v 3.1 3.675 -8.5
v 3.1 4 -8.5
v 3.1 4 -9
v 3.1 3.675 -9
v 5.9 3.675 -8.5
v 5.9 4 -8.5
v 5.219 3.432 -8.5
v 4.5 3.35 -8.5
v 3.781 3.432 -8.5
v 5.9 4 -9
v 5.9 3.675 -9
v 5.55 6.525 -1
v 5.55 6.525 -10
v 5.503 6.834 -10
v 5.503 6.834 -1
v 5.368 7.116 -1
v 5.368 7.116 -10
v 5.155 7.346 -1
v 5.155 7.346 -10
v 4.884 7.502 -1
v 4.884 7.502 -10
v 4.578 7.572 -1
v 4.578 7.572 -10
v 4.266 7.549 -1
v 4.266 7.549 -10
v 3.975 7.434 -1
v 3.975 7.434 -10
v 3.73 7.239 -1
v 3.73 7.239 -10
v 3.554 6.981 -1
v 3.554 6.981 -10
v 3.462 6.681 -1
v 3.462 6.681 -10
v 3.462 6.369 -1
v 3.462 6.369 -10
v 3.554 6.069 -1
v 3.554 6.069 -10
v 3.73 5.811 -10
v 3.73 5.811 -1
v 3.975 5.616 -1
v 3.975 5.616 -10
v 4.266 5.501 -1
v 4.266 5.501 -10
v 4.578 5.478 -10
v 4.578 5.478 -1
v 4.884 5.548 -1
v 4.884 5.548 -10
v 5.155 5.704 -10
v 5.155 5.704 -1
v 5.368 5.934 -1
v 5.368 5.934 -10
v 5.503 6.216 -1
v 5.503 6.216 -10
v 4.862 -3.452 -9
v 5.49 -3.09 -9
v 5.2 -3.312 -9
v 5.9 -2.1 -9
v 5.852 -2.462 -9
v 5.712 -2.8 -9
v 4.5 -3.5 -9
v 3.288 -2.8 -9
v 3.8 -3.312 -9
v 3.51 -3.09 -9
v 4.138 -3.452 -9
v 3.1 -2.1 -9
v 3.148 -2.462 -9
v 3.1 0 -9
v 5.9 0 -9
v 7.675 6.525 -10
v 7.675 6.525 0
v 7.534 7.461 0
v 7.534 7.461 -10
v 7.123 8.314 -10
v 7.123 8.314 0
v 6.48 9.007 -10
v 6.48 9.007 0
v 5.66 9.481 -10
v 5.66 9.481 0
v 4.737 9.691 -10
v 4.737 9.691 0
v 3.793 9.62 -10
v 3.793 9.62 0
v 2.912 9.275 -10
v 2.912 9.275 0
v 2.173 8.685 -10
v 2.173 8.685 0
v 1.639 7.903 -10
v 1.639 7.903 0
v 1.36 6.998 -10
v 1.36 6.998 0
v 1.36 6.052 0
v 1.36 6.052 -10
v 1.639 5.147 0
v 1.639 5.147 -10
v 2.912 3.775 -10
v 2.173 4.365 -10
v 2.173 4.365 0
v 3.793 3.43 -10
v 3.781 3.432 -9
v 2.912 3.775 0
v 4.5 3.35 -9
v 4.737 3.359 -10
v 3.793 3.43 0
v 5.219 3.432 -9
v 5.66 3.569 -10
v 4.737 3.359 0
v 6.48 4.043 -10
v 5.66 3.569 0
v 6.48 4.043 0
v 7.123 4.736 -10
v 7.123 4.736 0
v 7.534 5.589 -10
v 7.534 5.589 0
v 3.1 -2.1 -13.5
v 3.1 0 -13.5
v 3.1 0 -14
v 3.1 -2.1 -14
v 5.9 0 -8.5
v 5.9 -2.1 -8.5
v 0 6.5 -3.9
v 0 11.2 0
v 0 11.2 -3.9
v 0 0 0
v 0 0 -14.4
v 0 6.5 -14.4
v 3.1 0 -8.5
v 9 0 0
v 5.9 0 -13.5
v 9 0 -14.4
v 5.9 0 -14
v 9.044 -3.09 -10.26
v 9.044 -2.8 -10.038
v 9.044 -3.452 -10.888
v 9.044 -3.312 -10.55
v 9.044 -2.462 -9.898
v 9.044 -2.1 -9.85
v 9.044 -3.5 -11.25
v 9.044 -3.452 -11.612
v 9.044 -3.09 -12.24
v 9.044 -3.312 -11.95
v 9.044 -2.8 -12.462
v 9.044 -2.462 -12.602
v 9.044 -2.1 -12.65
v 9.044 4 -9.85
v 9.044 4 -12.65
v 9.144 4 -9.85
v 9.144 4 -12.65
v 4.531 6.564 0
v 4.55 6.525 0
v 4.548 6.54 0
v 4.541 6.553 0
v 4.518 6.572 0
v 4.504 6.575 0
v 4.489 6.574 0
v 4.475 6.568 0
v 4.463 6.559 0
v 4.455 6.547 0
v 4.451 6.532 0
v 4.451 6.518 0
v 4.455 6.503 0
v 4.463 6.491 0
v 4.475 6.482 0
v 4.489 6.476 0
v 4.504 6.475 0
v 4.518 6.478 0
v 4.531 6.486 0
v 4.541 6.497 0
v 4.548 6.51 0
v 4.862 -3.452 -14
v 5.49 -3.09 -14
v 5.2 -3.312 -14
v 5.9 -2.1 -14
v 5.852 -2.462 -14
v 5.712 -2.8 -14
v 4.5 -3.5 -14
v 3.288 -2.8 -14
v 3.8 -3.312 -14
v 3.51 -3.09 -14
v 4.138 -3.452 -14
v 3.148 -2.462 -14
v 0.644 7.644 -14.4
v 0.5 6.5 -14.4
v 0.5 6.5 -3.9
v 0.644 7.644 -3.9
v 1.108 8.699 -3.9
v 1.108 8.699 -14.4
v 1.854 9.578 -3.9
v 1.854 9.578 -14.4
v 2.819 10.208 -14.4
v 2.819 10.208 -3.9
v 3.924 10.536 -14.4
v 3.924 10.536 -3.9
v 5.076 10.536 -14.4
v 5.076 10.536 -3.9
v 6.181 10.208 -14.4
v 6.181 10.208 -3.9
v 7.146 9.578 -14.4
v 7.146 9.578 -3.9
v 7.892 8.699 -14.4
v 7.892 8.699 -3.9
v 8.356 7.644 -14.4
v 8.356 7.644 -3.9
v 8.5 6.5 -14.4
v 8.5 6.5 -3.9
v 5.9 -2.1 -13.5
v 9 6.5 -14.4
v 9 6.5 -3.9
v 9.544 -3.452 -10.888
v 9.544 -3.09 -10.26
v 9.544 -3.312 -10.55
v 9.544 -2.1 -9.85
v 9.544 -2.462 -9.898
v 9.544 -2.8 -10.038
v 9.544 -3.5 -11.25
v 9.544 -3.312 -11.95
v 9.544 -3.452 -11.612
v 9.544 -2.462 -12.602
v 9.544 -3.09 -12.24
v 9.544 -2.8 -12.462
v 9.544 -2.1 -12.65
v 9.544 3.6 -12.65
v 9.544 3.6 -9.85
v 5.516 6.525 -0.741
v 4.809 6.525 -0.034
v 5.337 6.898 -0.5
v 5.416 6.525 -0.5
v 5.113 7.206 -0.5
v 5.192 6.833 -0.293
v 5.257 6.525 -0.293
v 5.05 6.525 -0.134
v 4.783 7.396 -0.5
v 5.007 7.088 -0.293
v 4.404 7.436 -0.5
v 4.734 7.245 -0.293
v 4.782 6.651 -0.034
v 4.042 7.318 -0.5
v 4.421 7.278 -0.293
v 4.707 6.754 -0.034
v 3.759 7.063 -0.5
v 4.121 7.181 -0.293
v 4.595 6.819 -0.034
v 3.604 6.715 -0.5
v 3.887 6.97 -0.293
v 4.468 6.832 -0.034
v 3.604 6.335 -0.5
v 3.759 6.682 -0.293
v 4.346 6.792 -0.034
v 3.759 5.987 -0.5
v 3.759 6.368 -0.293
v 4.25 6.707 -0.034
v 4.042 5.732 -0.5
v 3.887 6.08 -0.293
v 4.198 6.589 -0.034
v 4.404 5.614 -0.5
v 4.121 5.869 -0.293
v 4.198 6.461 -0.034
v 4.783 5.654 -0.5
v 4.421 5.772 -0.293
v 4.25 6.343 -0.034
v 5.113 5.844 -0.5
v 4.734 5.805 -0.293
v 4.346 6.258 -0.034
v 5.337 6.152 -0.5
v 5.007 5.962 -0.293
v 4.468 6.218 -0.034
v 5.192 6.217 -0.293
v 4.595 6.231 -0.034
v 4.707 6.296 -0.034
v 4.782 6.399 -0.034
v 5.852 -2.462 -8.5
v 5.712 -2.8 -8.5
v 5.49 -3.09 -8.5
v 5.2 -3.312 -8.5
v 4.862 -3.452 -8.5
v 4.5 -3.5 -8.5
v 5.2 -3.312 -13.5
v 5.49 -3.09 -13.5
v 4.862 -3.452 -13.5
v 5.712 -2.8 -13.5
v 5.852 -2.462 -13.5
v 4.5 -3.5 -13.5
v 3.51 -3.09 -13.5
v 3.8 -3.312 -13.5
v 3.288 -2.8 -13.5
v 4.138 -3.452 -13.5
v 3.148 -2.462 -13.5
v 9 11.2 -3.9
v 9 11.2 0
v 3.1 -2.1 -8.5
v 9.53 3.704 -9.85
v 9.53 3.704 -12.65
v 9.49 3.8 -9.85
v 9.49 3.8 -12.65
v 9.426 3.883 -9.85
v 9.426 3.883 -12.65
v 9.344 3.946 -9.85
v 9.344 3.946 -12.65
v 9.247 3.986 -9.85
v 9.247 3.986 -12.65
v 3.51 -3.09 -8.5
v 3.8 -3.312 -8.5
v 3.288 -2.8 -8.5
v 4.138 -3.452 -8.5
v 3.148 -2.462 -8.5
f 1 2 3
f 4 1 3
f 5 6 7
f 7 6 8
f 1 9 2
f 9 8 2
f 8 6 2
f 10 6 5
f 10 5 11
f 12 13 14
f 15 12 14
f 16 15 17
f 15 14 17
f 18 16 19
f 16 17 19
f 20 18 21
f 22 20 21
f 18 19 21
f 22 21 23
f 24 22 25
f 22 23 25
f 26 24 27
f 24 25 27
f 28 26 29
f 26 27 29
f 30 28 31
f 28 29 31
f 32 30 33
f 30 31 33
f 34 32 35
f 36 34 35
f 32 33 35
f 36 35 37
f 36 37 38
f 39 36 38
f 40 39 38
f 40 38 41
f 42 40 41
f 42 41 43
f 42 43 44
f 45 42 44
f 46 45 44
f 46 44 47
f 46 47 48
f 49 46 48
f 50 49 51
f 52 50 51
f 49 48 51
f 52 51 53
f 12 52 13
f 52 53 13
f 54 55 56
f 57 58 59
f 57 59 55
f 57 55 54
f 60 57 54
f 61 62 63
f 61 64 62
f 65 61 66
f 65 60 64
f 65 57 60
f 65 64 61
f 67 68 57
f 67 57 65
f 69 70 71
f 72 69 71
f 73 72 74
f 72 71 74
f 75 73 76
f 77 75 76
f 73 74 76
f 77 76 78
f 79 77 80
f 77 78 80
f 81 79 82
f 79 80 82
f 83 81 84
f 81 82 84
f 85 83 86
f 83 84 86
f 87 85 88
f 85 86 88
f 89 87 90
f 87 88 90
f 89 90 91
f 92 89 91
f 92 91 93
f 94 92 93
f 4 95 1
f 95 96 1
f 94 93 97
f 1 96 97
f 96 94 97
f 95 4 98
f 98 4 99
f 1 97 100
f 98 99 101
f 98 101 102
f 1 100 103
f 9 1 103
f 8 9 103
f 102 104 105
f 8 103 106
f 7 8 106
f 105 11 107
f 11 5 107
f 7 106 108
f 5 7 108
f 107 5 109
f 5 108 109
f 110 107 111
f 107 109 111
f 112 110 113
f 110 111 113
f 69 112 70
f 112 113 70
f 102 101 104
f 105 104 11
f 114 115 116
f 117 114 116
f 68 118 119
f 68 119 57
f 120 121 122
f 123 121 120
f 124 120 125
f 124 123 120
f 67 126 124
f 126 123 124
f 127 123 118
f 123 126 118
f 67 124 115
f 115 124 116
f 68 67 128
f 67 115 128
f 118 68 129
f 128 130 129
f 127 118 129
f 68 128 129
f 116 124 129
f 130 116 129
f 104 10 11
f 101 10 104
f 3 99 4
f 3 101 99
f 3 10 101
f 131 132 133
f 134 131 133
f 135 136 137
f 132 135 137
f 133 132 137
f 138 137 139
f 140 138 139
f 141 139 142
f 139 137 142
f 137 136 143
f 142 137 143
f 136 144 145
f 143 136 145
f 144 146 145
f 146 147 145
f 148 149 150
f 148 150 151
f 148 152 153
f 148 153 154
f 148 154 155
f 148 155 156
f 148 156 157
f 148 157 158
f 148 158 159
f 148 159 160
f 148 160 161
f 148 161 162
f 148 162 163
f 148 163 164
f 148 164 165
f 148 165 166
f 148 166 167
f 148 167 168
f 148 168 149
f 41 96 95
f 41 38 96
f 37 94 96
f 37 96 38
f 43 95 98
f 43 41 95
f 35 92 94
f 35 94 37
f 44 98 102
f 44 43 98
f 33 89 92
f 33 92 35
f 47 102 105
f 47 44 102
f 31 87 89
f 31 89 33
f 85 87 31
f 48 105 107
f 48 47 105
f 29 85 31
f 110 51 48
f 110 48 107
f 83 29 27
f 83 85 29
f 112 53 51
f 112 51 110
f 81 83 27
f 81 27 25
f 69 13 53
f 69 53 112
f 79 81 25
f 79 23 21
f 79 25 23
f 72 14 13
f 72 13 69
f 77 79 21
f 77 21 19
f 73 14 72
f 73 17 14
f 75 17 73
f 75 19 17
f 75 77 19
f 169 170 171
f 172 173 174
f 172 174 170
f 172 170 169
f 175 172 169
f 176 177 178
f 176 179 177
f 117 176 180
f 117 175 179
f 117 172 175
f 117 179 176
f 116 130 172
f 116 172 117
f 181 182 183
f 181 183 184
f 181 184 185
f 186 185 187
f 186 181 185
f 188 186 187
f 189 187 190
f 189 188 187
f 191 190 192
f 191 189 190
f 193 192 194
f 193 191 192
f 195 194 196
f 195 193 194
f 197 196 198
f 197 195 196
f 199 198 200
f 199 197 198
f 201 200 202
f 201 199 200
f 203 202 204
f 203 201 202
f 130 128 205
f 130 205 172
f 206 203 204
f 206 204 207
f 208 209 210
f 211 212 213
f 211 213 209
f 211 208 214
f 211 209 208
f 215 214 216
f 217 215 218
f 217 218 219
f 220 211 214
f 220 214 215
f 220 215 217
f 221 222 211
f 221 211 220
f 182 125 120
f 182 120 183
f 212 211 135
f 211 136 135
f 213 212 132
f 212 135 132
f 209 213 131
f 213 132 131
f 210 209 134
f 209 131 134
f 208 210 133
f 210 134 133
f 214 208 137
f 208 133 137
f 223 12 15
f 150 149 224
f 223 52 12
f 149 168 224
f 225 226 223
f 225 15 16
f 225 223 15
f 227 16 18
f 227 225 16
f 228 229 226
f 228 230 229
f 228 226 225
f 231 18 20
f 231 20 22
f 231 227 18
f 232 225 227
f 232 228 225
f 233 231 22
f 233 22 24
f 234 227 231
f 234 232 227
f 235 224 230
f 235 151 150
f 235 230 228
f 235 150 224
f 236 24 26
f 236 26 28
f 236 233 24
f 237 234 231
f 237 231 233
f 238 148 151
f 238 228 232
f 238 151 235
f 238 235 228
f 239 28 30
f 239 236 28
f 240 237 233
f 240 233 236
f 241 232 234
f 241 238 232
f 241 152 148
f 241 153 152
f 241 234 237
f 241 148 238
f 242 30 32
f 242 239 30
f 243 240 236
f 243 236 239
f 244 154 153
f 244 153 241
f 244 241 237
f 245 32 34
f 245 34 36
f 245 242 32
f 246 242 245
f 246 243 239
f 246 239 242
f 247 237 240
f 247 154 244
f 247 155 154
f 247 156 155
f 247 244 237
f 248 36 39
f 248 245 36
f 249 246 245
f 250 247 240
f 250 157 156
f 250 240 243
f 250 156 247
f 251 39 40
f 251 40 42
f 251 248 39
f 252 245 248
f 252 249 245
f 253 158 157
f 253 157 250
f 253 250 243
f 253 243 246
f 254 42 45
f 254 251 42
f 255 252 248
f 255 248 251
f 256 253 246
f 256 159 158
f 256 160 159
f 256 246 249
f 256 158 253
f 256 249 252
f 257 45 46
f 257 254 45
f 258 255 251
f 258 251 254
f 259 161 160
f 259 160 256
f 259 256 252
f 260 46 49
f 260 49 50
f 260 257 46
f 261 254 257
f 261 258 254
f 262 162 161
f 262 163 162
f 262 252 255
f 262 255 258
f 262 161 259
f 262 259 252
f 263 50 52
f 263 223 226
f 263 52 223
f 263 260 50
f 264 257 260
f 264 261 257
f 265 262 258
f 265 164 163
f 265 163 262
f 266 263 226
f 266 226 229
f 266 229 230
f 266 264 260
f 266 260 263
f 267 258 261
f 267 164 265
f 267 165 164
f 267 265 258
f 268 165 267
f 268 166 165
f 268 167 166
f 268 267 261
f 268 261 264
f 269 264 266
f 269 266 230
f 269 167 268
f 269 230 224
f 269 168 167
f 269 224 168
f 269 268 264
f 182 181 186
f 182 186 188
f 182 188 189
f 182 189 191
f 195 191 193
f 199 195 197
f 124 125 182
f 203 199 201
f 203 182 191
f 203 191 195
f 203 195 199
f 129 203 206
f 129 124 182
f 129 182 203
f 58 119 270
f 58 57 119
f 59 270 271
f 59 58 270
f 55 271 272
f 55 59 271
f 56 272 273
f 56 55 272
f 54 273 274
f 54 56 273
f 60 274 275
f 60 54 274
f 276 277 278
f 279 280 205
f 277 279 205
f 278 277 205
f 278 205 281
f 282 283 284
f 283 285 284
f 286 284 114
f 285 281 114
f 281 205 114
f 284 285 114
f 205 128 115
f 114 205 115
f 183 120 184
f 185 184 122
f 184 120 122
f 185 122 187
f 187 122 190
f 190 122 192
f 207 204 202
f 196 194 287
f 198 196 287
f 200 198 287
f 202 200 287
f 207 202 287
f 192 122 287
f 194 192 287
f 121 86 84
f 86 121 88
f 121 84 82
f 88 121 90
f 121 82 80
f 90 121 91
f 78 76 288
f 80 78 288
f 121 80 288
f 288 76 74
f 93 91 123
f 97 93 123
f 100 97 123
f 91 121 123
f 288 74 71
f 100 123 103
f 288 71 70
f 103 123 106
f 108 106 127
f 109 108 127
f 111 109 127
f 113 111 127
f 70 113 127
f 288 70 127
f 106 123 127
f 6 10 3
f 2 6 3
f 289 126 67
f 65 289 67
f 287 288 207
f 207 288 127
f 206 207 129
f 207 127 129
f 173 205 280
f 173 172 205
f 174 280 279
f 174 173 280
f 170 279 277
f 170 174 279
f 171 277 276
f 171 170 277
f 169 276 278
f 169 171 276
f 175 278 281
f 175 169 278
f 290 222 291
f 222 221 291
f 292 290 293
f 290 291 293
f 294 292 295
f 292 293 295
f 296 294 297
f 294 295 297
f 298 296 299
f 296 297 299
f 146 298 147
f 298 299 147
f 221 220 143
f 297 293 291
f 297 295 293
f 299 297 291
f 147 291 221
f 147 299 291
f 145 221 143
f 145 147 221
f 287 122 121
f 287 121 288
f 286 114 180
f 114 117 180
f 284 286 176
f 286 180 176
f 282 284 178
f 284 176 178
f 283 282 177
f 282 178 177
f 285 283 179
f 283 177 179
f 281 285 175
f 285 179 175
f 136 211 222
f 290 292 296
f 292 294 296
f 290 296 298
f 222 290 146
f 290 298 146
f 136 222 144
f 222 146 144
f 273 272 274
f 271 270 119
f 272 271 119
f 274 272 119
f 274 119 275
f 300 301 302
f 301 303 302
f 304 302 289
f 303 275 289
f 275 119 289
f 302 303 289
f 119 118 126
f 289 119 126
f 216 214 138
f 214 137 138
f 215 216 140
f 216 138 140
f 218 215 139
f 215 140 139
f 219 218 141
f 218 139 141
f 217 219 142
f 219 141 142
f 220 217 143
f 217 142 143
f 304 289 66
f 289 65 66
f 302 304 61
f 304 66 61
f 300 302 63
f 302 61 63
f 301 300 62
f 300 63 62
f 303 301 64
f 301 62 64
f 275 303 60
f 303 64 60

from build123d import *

# Parameters (mm, degrees)
SCHIZZO1_W                        = 9
SCHIZZO1_H                        = 14.4
ESTRUSIONE_ESTRUSIONE1_DEPTH      = 11.2
SCHIZZO2_R                        = 3.175
TAGLIO_ESTRUSIONE1_DEPTH          = 10
SCHIZZO3_R                        = 1.05
ESTRUSIONE_ESTRUSIONE2_DEPTH      = 10
RACCORDO1_R                       = 1
TAGLIO_ESTRUSIONE2_DEPTH          = 10.5
ESTRUSIONE_ESTRUSIONE3_DEPTH      = 3.5
ESTRUSIONE_ESTRUSIONE3_DEPTH_BACK = 4
SCHIZZO5_W                        = 2.8
SCHIZZO5_H                        = 0.5
SCHIZZO5_W_2                      = 0.5
SCHIZZO5_H_2                      = 2.8
RACCORDO2_R                       = 0.4
RACCORDO3_R                       = 1.4
RACCORDO4_R                       = 1.4
RACCORDO5_R                       = 1.4


with BuildPart() as part:
    # Schizzo1 → Estrusione-Estrusione1 (new body)
    with BuildSketch(Plane(origin=(0, 0, 0), x_dir=(1, 0, 0), z_dir=(0, 1, 0))):
        with Locations((4.5, 7.2)):
            Rectangle(SCHIZZO1_W, SCHIZZO1_H)
    extrude(amount=ESTRUSIONE_ESTRUSIONE1_DEPTH)

    # Schizzo2 → Taglio-Estrusione1 (cut)
    with BuildSketch(Plane.XY):
        with Locations((4.5, 6.525)):
            Circle(SCHIZZO2_R)
    extrude(amount=-TAGLIO_ESTRUSIONE1_DEPTH, mode=Mode.SUBTRACT)

    # Schizzo3 → Estrusione-Estrusione2 (add)
    with BuildSketch(Plane.XY.offset(-10)):
        with Locations((4.5, 6.525)):
            Circle(SCHIZZO3_R)
    extrude(amount=ESTRUSIONE_ESTRUSIONE2_DEPTH)

    # Raccordo1
    raccordo1_edges = [part.edges().sort_by_distance(p)[0] for p in [
        (3.45, 6.525, 0),
    ]]
    fillet(raccordo1_edges, radius=RACCORDO1_R)

    # Schizzo4 → Taglio-Estrusione2 (cut)
    with BuildSketch(Plane(origin=(0, 0, -14.4), x_dir=(-1, 0, 0), z_dir=(0, 0, -1))):
        with BuildLine():
            Line((-9, 6.5), (-9, 11.2))
            Line((-9, 11.2), (0, 11.2))
            Line((0, 11.2), (0, 6.5))
            Line((0, 6.5), (-0.5, 6.5))
            ThreePointArc((-0.5, 6.5), (-4.5, 10.578198038), (-8.5, 6.5))
            Line((-8.5, 6.5), (-9, 6.5))
        make_face()
    extrude(amount=-TAGLIO_ESTRUSIONE2_DEPTH, mode=Mode.SUBTRACT)

    # Schizzo5 → Estrusione-Estrusione3 (add, two sides: drawn at the far end of the back side and taken through both)
    with BuildSketch(Plane(origin=(0, 0, 0), x_dir=(-1, 0, 0), z_dir=(0, -1, 0)).offset(-ESTRUSIONE_ESTRUSIONE3_DEPTH_BACK)):
        with Locations((-4.5, 8.75)):
            Rectangle(SCHIZZO5_W, SCHIZZO5_H)
        with Locations((-4.5, 13.75)):
            Rectangle(SCHIZZO5_W, SCHIZZO5_H)
        with Locations((-9.293549244, 11.25)):
            Rectangle(SCHIZZO5_W_2, SCHIZZO5_H_2)
    extrude(amount=ESTRUSIONE_ESTRUSIONE3_DEPTH + ESTRUSIONE_ESTRUSIONE3_DEPTH_BACK)


with BuildPart() as estrusione_estrusione3_piece_1:
    # of the separate pieces the step leaves, piece 1, a body of its own (estrusione_estrusione3_pieces)
    add(part.part.solids().sort_by_distance((5.55, 6.525, -1))[0])

    # Raccordo4
    raccordo4_edges = [estrusione_estrusione3_piece_1.edges().sort_by_distance(p)[0] for p in [
        (3.1, -3.5, -13.75),
        (5.9, -3.5, -13.75),
    ]]
    fillet(raccordo4_edges, radius=RACCORDO4_R - 0.0001)  # a hair under: the kernel refuses the full size

    # Raccordo5
    raccordo5_edges = [estrusione_estrusione3_piece_1.edges().sort_by_distance(p)[0] for p in [
        (3.1, -3.5, -8.75),
        (5.9, -3.5, -8.75),
    ]]
    fillet(raccordo5_edges, radius=RACCORDO5_R - 0.0001)  # a hair under: the kernel refuses the full size


with BuildPart() as estrusione_estrusione3_piece_2:
    # of the separate pieces the step leaves, piece 2, a body of its own (estrusione_estrusione3_pieces)
    add(part.part.solids().sort_by_distance((9.043549244, -3.5, -9.85))[0])

    # Raccordo2
    raccordo2_edges = [estrusione_estrusione3_piece_2.edges().sort_by_distance(p)[0] for p in [
        (9.543549244, 4, -11.25),
    ]]
    fillet(raccordo2_edges, radius=RACCORDO2_R)

    # Raccordo3
    raccordo3_edges = [estrusione_estrusione3_piece_2.edges().sort_by_distance(p)[0] for p in [
        (9.293549244, -3.5, -9.85),
        (9.293549244, -3.5, -12.65),
    ]]
    fillet(raccordo3_edges, radius=RACCORDO3_R - 0.0001)  # a hair under: the kernel refuses the full size


solid = Compound([estrusione_estrusione3_piece_1.part, estrusione_estrusione3_piece_2.part])
